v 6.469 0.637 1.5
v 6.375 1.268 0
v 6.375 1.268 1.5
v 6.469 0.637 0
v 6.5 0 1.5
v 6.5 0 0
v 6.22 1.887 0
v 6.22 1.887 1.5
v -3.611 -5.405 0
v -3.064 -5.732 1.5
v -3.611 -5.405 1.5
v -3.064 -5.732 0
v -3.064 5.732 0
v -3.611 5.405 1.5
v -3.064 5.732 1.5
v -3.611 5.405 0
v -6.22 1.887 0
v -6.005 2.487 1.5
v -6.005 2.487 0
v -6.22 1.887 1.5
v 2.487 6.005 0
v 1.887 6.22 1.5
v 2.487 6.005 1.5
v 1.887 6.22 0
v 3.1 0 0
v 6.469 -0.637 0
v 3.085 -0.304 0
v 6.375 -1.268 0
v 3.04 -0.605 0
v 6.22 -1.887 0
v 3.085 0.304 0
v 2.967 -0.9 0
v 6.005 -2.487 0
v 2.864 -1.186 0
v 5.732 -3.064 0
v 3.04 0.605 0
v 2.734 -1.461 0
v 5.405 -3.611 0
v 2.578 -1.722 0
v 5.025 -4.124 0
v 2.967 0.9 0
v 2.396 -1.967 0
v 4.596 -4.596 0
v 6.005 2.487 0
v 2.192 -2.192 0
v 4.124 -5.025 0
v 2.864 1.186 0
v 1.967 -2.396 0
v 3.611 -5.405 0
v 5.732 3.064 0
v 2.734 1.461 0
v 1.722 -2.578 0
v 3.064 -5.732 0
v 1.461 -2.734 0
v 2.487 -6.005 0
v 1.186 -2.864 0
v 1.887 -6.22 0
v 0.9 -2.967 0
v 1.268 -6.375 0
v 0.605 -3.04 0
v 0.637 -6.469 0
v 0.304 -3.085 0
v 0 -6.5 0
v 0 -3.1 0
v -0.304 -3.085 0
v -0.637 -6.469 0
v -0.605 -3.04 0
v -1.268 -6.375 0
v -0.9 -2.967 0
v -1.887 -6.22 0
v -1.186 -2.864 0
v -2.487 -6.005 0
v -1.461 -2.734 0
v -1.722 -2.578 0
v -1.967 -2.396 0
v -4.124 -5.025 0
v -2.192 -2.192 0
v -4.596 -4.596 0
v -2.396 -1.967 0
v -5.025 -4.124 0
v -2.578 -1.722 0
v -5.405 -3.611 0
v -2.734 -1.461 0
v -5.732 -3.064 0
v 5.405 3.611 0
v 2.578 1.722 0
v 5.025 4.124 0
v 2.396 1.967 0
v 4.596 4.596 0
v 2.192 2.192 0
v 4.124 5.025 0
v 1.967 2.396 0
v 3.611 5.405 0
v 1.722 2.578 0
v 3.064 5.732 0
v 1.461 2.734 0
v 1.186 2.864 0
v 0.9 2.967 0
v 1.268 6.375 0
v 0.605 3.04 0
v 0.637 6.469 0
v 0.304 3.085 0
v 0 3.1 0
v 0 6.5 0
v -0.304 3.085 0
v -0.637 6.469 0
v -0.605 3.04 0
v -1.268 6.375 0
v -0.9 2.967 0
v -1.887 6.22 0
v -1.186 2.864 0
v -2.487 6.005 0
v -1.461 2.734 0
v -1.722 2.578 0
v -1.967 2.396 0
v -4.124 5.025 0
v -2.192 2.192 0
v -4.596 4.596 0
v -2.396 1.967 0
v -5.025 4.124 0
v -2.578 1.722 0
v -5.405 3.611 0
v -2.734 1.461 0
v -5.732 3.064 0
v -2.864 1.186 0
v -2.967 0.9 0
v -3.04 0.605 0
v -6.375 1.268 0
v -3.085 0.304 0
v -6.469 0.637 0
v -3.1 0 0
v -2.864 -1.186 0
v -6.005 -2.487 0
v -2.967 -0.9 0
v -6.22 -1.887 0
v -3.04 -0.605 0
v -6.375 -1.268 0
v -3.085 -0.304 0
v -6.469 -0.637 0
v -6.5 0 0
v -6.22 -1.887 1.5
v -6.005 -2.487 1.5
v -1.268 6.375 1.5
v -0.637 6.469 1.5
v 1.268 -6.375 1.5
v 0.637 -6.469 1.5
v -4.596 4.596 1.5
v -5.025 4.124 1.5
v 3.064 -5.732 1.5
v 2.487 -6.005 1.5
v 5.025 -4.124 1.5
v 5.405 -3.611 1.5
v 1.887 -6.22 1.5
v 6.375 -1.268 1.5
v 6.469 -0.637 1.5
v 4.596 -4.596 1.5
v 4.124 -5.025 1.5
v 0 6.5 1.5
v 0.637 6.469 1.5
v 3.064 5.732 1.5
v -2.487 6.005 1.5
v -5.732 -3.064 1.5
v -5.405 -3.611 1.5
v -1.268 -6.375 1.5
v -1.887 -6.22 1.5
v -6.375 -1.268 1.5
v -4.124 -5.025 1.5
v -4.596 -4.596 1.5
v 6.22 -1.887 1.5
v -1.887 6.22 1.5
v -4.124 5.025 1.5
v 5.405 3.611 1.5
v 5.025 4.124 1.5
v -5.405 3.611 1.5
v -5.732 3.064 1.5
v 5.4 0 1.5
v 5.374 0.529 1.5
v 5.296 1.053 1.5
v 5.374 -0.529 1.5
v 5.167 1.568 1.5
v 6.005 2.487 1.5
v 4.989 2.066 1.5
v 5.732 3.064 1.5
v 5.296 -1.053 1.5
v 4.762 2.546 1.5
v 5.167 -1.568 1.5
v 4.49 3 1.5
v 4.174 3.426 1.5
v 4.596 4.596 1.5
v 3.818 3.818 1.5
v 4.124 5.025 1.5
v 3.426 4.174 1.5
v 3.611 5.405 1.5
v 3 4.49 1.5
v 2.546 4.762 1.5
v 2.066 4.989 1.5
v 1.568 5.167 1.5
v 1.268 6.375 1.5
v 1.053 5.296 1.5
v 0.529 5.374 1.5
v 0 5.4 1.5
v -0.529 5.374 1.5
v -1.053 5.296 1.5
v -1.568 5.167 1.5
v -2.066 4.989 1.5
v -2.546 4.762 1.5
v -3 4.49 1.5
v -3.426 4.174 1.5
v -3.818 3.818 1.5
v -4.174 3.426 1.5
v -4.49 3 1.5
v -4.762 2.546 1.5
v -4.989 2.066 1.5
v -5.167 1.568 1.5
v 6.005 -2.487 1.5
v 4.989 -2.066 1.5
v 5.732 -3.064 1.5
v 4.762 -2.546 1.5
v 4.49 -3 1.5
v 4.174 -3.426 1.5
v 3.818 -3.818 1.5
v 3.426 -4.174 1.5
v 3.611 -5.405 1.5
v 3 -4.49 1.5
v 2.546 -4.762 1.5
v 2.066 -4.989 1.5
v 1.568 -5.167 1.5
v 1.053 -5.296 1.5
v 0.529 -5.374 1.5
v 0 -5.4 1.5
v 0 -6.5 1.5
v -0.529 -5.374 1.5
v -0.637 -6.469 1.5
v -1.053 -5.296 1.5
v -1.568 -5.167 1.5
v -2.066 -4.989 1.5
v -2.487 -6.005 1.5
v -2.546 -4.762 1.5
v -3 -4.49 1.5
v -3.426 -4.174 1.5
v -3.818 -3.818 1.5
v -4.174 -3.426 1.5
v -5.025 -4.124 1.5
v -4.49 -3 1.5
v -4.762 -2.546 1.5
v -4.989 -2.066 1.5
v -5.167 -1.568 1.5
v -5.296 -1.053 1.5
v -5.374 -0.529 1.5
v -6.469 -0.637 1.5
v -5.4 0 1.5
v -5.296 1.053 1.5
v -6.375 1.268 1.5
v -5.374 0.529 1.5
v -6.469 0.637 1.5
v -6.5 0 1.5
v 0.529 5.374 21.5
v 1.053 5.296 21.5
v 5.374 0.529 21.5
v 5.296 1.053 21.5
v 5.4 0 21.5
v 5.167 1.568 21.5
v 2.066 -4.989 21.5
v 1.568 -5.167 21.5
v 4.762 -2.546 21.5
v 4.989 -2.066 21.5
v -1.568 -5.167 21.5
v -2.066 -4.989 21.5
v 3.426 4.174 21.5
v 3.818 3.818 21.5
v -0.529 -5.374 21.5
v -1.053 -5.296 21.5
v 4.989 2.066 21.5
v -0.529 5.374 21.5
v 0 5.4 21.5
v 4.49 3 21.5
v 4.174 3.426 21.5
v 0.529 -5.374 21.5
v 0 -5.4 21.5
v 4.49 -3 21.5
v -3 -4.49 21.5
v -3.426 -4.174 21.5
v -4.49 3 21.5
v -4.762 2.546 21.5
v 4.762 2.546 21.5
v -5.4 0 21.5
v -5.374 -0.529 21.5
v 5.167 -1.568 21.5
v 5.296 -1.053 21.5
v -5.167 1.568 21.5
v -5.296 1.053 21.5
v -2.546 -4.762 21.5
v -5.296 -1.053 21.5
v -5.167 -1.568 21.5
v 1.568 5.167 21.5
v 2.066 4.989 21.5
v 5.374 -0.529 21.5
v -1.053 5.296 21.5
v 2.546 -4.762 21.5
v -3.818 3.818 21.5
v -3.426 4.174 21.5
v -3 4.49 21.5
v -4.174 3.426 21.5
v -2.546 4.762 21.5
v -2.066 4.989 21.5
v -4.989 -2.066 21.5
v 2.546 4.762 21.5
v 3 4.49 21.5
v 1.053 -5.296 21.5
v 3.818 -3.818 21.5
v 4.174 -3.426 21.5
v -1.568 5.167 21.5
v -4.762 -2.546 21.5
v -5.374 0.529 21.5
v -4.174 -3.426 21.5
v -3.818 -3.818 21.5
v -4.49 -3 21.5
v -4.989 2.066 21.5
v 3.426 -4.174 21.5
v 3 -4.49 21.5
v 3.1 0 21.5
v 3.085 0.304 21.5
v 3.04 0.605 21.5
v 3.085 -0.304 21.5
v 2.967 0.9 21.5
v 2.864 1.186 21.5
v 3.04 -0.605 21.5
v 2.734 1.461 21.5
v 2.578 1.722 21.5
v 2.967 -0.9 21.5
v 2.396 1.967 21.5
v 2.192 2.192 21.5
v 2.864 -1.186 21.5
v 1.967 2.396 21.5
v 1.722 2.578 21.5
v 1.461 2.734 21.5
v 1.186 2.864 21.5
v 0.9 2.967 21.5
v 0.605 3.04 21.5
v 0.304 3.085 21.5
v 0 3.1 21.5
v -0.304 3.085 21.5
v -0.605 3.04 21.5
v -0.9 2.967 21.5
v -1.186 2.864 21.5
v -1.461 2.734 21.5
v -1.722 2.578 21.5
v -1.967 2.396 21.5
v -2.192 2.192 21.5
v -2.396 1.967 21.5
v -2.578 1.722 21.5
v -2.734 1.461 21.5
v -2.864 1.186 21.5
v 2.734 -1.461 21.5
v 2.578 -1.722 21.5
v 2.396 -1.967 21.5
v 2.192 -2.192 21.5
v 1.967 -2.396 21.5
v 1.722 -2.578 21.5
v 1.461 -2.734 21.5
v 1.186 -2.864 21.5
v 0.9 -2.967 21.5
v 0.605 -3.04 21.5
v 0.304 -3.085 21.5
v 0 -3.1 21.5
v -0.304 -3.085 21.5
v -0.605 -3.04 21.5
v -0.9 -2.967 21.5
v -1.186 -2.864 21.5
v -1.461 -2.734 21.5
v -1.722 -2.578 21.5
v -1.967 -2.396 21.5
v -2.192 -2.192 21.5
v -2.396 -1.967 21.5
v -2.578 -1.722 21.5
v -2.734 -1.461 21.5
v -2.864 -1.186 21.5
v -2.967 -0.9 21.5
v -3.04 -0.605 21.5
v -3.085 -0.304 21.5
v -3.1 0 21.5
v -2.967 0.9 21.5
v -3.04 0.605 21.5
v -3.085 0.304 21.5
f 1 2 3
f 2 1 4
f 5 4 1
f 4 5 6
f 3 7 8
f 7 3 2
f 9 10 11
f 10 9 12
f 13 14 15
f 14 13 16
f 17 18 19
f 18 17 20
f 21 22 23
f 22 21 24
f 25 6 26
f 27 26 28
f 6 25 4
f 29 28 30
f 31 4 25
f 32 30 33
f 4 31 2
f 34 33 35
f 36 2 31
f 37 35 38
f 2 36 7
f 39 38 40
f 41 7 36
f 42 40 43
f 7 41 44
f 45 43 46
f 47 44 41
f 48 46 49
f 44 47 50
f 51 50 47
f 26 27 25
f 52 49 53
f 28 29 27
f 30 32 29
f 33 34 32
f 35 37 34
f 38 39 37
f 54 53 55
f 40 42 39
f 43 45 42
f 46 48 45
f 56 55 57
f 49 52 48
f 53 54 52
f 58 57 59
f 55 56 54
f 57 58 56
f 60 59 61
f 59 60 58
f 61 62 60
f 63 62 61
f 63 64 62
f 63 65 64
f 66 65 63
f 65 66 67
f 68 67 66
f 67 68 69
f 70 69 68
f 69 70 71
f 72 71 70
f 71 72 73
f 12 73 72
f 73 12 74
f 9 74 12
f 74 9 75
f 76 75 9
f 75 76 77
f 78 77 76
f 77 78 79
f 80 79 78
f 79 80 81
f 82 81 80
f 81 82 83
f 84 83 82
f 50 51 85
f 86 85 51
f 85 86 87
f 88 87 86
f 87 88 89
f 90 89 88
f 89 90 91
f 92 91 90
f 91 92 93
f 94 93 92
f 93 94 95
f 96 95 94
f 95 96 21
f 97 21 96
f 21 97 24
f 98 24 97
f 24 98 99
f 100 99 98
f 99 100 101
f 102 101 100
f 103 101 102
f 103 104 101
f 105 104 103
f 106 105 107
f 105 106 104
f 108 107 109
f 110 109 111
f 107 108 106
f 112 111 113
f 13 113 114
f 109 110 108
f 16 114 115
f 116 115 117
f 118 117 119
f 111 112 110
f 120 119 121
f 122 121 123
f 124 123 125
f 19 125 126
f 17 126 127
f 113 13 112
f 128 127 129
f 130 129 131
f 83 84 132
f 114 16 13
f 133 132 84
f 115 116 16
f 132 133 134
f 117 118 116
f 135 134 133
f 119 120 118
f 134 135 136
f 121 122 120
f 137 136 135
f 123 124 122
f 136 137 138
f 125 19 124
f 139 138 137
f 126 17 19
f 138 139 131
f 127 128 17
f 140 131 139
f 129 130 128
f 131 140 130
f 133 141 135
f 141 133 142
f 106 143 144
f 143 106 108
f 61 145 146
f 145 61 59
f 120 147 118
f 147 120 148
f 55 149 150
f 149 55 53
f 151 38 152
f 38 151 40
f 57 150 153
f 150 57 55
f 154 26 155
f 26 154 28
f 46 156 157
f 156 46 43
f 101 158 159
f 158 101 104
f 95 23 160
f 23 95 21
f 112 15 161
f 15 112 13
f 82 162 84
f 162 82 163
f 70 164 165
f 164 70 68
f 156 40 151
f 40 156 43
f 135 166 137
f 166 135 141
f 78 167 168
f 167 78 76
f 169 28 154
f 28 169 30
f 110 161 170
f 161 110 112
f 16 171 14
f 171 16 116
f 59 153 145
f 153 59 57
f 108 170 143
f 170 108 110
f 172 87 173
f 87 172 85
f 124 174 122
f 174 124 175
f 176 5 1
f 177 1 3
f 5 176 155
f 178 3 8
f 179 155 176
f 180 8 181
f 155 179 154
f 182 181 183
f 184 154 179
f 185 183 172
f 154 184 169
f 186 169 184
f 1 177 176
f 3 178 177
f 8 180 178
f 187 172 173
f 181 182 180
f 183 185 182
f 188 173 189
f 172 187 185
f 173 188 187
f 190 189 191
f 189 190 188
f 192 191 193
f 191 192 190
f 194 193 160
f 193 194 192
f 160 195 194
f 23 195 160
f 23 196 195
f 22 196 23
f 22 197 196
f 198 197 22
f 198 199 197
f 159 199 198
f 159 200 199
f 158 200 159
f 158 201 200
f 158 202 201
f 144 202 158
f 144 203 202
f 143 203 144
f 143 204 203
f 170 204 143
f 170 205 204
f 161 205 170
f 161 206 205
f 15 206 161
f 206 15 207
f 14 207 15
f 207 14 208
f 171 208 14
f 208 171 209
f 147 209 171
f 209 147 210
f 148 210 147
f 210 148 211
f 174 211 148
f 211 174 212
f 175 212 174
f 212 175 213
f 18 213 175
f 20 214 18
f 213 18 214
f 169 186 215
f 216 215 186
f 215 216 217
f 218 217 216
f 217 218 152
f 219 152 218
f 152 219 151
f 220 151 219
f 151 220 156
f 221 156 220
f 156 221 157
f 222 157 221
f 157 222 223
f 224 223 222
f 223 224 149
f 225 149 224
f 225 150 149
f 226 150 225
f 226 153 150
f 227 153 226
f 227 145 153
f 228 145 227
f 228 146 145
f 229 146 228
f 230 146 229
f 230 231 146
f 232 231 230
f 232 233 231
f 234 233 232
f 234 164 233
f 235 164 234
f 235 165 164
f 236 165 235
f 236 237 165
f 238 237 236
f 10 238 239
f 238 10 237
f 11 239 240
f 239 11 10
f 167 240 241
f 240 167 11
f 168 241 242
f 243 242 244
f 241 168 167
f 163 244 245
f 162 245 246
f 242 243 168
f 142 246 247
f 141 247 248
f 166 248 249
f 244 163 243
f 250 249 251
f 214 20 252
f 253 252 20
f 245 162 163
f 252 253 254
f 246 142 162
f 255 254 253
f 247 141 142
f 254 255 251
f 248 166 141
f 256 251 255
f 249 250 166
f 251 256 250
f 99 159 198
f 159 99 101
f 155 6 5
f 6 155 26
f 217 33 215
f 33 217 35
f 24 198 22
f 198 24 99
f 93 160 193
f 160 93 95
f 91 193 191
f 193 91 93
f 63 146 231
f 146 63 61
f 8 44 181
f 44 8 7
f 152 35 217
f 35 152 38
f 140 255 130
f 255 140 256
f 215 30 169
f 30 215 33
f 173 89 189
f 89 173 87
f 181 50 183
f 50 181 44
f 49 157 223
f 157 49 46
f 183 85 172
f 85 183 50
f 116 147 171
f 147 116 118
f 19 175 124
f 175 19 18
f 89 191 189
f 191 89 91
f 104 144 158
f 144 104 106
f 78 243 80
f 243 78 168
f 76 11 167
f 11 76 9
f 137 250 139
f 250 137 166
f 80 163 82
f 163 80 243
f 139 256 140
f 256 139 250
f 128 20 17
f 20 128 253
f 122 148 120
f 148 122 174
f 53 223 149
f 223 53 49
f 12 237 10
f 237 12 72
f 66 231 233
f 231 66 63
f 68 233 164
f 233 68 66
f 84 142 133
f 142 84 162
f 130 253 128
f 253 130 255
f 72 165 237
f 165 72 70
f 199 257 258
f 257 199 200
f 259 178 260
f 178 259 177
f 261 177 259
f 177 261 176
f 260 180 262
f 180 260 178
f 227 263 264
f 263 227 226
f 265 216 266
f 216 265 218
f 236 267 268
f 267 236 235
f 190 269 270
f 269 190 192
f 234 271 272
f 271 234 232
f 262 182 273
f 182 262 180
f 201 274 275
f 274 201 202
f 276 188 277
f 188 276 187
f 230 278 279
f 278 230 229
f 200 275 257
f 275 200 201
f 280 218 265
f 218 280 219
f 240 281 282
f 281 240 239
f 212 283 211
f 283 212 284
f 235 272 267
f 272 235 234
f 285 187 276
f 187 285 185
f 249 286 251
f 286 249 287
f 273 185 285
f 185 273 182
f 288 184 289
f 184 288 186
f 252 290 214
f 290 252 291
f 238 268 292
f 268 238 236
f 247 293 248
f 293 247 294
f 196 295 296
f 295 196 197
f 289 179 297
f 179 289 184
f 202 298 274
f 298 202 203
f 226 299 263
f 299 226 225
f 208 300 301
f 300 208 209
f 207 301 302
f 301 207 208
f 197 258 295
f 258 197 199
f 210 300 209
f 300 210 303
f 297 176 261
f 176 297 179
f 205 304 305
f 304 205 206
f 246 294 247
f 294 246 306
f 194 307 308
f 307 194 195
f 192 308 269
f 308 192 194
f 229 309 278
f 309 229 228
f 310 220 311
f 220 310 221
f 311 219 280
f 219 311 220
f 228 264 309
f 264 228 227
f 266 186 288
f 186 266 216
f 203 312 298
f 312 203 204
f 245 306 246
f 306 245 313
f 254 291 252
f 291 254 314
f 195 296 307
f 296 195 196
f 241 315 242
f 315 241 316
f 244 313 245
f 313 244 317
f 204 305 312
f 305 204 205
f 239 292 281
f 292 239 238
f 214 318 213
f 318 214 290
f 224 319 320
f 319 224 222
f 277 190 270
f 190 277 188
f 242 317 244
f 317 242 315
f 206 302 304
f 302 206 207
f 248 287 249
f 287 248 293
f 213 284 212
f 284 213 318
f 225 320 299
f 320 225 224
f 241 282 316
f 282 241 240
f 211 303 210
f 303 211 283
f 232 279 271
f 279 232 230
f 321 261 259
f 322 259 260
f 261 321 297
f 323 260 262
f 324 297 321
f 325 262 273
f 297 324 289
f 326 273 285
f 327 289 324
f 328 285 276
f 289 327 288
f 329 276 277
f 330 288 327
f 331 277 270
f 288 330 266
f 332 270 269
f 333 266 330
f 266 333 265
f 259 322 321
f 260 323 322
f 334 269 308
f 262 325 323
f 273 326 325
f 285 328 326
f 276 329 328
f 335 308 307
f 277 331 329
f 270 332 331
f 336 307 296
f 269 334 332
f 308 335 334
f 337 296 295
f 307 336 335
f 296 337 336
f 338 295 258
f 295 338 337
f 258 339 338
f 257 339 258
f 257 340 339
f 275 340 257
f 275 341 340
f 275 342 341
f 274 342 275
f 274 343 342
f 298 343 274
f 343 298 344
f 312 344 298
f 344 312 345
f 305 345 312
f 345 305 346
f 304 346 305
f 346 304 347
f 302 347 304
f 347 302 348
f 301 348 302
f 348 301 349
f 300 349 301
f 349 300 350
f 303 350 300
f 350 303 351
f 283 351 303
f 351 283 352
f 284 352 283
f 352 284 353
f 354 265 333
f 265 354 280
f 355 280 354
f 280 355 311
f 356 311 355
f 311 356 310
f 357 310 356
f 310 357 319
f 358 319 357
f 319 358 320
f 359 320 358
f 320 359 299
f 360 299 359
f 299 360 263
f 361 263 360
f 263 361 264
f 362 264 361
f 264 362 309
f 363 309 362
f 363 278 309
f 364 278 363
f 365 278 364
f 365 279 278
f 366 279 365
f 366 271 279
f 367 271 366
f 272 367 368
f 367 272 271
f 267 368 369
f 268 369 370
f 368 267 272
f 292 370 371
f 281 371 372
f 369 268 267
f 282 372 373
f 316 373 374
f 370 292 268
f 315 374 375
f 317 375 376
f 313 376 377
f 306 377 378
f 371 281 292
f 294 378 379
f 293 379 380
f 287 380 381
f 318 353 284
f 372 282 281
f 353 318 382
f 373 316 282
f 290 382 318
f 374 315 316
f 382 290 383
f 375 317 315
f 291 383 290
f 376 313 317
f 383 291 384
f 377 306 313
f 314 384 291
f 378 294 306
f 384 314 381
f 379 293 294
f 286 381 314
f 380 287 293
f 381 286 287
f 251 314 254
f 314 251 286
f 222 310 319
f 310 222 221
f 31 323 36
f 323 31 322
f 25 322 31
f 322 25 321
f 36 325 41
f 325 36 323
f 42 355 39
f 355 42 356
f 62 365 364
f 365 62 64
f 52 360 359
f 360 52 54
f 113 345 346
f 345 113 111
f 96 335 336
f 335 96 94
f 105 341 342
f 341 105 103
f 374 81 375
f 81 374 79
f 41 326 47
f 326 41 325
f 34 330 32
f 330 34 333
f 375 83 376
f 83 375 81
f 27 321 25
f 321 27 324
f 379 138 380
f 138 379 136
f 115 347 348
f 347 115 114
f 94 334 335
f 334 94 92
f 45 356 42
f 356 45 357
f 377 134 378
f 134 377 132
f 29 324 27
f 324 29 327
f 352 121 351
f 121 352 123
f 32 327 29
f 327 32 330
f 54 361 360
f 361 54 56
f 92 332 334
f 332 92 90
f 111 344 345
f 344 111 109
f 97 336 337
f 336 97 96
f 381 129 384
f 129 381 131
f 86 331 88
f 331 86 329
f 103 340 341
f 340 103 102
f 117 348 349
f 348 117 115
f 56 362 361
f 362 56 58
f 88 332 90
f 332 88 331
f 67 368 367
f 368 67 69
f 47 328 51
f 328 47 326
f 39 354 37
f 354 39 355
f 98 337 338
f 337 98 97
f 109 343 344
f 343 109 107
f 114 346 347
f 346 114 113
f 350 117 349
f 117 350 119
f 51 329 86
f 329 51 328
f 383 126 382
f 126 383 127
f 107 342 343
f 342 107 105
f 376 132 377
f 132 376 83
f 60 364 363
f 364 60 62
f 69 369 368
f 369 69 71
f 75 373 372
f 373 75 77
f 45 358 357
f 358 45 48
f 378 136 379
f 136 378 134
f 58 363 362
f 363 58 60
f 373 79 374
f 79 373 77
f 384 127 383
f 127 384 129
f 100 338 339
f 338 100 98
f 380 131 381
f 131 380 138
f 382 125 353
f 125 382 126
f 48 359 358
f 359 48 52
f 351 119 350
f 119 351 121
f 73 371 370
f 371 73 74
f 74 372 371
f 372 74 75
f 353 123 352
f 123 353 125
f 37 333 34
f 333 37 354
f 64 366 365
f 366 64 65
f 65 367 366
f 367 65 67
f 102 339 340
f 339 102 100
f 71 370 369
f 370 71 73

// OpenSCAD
// PCR tube adapter sleeve: fits a 0.2 mL tube in a 1.5 mL rack hole
// Print orientation: collar on bed (z = 0), sleeve body rises to z = 21.5

$fn = 64;

// ---- Dimensions (mm) ----
collar_d        = 13;     // collar outer diameter
collar_t        = 1.5;    // collar thickness (z = 0 to 1.5)
sleeve_od       = 10.8;   // sleeve body outer diameter
sleeve_h        = 20;     // sleeve body height above collar (z = 1.5 to 21.5)
bore_d          = 6.2;    // through-bore diameter
eps             = 0.5;    // cutter overshoot past faces

total_h = collar_t + sleeve_h;  // full height (z = 0 to 21.5)

difference() {
    union() {
        // Collar
        cylinder(d = collar_d, h = collar_t);
        // Sleeve body
        translate([0, 0, collar_t])
            cylinder(d = sleeve_od, h = sleeve_h);
    }
    // Through-bore
    translate([0, 0, -eps])
        cylinder(d = bore_d, h = total_h + 2 * eps);
}
